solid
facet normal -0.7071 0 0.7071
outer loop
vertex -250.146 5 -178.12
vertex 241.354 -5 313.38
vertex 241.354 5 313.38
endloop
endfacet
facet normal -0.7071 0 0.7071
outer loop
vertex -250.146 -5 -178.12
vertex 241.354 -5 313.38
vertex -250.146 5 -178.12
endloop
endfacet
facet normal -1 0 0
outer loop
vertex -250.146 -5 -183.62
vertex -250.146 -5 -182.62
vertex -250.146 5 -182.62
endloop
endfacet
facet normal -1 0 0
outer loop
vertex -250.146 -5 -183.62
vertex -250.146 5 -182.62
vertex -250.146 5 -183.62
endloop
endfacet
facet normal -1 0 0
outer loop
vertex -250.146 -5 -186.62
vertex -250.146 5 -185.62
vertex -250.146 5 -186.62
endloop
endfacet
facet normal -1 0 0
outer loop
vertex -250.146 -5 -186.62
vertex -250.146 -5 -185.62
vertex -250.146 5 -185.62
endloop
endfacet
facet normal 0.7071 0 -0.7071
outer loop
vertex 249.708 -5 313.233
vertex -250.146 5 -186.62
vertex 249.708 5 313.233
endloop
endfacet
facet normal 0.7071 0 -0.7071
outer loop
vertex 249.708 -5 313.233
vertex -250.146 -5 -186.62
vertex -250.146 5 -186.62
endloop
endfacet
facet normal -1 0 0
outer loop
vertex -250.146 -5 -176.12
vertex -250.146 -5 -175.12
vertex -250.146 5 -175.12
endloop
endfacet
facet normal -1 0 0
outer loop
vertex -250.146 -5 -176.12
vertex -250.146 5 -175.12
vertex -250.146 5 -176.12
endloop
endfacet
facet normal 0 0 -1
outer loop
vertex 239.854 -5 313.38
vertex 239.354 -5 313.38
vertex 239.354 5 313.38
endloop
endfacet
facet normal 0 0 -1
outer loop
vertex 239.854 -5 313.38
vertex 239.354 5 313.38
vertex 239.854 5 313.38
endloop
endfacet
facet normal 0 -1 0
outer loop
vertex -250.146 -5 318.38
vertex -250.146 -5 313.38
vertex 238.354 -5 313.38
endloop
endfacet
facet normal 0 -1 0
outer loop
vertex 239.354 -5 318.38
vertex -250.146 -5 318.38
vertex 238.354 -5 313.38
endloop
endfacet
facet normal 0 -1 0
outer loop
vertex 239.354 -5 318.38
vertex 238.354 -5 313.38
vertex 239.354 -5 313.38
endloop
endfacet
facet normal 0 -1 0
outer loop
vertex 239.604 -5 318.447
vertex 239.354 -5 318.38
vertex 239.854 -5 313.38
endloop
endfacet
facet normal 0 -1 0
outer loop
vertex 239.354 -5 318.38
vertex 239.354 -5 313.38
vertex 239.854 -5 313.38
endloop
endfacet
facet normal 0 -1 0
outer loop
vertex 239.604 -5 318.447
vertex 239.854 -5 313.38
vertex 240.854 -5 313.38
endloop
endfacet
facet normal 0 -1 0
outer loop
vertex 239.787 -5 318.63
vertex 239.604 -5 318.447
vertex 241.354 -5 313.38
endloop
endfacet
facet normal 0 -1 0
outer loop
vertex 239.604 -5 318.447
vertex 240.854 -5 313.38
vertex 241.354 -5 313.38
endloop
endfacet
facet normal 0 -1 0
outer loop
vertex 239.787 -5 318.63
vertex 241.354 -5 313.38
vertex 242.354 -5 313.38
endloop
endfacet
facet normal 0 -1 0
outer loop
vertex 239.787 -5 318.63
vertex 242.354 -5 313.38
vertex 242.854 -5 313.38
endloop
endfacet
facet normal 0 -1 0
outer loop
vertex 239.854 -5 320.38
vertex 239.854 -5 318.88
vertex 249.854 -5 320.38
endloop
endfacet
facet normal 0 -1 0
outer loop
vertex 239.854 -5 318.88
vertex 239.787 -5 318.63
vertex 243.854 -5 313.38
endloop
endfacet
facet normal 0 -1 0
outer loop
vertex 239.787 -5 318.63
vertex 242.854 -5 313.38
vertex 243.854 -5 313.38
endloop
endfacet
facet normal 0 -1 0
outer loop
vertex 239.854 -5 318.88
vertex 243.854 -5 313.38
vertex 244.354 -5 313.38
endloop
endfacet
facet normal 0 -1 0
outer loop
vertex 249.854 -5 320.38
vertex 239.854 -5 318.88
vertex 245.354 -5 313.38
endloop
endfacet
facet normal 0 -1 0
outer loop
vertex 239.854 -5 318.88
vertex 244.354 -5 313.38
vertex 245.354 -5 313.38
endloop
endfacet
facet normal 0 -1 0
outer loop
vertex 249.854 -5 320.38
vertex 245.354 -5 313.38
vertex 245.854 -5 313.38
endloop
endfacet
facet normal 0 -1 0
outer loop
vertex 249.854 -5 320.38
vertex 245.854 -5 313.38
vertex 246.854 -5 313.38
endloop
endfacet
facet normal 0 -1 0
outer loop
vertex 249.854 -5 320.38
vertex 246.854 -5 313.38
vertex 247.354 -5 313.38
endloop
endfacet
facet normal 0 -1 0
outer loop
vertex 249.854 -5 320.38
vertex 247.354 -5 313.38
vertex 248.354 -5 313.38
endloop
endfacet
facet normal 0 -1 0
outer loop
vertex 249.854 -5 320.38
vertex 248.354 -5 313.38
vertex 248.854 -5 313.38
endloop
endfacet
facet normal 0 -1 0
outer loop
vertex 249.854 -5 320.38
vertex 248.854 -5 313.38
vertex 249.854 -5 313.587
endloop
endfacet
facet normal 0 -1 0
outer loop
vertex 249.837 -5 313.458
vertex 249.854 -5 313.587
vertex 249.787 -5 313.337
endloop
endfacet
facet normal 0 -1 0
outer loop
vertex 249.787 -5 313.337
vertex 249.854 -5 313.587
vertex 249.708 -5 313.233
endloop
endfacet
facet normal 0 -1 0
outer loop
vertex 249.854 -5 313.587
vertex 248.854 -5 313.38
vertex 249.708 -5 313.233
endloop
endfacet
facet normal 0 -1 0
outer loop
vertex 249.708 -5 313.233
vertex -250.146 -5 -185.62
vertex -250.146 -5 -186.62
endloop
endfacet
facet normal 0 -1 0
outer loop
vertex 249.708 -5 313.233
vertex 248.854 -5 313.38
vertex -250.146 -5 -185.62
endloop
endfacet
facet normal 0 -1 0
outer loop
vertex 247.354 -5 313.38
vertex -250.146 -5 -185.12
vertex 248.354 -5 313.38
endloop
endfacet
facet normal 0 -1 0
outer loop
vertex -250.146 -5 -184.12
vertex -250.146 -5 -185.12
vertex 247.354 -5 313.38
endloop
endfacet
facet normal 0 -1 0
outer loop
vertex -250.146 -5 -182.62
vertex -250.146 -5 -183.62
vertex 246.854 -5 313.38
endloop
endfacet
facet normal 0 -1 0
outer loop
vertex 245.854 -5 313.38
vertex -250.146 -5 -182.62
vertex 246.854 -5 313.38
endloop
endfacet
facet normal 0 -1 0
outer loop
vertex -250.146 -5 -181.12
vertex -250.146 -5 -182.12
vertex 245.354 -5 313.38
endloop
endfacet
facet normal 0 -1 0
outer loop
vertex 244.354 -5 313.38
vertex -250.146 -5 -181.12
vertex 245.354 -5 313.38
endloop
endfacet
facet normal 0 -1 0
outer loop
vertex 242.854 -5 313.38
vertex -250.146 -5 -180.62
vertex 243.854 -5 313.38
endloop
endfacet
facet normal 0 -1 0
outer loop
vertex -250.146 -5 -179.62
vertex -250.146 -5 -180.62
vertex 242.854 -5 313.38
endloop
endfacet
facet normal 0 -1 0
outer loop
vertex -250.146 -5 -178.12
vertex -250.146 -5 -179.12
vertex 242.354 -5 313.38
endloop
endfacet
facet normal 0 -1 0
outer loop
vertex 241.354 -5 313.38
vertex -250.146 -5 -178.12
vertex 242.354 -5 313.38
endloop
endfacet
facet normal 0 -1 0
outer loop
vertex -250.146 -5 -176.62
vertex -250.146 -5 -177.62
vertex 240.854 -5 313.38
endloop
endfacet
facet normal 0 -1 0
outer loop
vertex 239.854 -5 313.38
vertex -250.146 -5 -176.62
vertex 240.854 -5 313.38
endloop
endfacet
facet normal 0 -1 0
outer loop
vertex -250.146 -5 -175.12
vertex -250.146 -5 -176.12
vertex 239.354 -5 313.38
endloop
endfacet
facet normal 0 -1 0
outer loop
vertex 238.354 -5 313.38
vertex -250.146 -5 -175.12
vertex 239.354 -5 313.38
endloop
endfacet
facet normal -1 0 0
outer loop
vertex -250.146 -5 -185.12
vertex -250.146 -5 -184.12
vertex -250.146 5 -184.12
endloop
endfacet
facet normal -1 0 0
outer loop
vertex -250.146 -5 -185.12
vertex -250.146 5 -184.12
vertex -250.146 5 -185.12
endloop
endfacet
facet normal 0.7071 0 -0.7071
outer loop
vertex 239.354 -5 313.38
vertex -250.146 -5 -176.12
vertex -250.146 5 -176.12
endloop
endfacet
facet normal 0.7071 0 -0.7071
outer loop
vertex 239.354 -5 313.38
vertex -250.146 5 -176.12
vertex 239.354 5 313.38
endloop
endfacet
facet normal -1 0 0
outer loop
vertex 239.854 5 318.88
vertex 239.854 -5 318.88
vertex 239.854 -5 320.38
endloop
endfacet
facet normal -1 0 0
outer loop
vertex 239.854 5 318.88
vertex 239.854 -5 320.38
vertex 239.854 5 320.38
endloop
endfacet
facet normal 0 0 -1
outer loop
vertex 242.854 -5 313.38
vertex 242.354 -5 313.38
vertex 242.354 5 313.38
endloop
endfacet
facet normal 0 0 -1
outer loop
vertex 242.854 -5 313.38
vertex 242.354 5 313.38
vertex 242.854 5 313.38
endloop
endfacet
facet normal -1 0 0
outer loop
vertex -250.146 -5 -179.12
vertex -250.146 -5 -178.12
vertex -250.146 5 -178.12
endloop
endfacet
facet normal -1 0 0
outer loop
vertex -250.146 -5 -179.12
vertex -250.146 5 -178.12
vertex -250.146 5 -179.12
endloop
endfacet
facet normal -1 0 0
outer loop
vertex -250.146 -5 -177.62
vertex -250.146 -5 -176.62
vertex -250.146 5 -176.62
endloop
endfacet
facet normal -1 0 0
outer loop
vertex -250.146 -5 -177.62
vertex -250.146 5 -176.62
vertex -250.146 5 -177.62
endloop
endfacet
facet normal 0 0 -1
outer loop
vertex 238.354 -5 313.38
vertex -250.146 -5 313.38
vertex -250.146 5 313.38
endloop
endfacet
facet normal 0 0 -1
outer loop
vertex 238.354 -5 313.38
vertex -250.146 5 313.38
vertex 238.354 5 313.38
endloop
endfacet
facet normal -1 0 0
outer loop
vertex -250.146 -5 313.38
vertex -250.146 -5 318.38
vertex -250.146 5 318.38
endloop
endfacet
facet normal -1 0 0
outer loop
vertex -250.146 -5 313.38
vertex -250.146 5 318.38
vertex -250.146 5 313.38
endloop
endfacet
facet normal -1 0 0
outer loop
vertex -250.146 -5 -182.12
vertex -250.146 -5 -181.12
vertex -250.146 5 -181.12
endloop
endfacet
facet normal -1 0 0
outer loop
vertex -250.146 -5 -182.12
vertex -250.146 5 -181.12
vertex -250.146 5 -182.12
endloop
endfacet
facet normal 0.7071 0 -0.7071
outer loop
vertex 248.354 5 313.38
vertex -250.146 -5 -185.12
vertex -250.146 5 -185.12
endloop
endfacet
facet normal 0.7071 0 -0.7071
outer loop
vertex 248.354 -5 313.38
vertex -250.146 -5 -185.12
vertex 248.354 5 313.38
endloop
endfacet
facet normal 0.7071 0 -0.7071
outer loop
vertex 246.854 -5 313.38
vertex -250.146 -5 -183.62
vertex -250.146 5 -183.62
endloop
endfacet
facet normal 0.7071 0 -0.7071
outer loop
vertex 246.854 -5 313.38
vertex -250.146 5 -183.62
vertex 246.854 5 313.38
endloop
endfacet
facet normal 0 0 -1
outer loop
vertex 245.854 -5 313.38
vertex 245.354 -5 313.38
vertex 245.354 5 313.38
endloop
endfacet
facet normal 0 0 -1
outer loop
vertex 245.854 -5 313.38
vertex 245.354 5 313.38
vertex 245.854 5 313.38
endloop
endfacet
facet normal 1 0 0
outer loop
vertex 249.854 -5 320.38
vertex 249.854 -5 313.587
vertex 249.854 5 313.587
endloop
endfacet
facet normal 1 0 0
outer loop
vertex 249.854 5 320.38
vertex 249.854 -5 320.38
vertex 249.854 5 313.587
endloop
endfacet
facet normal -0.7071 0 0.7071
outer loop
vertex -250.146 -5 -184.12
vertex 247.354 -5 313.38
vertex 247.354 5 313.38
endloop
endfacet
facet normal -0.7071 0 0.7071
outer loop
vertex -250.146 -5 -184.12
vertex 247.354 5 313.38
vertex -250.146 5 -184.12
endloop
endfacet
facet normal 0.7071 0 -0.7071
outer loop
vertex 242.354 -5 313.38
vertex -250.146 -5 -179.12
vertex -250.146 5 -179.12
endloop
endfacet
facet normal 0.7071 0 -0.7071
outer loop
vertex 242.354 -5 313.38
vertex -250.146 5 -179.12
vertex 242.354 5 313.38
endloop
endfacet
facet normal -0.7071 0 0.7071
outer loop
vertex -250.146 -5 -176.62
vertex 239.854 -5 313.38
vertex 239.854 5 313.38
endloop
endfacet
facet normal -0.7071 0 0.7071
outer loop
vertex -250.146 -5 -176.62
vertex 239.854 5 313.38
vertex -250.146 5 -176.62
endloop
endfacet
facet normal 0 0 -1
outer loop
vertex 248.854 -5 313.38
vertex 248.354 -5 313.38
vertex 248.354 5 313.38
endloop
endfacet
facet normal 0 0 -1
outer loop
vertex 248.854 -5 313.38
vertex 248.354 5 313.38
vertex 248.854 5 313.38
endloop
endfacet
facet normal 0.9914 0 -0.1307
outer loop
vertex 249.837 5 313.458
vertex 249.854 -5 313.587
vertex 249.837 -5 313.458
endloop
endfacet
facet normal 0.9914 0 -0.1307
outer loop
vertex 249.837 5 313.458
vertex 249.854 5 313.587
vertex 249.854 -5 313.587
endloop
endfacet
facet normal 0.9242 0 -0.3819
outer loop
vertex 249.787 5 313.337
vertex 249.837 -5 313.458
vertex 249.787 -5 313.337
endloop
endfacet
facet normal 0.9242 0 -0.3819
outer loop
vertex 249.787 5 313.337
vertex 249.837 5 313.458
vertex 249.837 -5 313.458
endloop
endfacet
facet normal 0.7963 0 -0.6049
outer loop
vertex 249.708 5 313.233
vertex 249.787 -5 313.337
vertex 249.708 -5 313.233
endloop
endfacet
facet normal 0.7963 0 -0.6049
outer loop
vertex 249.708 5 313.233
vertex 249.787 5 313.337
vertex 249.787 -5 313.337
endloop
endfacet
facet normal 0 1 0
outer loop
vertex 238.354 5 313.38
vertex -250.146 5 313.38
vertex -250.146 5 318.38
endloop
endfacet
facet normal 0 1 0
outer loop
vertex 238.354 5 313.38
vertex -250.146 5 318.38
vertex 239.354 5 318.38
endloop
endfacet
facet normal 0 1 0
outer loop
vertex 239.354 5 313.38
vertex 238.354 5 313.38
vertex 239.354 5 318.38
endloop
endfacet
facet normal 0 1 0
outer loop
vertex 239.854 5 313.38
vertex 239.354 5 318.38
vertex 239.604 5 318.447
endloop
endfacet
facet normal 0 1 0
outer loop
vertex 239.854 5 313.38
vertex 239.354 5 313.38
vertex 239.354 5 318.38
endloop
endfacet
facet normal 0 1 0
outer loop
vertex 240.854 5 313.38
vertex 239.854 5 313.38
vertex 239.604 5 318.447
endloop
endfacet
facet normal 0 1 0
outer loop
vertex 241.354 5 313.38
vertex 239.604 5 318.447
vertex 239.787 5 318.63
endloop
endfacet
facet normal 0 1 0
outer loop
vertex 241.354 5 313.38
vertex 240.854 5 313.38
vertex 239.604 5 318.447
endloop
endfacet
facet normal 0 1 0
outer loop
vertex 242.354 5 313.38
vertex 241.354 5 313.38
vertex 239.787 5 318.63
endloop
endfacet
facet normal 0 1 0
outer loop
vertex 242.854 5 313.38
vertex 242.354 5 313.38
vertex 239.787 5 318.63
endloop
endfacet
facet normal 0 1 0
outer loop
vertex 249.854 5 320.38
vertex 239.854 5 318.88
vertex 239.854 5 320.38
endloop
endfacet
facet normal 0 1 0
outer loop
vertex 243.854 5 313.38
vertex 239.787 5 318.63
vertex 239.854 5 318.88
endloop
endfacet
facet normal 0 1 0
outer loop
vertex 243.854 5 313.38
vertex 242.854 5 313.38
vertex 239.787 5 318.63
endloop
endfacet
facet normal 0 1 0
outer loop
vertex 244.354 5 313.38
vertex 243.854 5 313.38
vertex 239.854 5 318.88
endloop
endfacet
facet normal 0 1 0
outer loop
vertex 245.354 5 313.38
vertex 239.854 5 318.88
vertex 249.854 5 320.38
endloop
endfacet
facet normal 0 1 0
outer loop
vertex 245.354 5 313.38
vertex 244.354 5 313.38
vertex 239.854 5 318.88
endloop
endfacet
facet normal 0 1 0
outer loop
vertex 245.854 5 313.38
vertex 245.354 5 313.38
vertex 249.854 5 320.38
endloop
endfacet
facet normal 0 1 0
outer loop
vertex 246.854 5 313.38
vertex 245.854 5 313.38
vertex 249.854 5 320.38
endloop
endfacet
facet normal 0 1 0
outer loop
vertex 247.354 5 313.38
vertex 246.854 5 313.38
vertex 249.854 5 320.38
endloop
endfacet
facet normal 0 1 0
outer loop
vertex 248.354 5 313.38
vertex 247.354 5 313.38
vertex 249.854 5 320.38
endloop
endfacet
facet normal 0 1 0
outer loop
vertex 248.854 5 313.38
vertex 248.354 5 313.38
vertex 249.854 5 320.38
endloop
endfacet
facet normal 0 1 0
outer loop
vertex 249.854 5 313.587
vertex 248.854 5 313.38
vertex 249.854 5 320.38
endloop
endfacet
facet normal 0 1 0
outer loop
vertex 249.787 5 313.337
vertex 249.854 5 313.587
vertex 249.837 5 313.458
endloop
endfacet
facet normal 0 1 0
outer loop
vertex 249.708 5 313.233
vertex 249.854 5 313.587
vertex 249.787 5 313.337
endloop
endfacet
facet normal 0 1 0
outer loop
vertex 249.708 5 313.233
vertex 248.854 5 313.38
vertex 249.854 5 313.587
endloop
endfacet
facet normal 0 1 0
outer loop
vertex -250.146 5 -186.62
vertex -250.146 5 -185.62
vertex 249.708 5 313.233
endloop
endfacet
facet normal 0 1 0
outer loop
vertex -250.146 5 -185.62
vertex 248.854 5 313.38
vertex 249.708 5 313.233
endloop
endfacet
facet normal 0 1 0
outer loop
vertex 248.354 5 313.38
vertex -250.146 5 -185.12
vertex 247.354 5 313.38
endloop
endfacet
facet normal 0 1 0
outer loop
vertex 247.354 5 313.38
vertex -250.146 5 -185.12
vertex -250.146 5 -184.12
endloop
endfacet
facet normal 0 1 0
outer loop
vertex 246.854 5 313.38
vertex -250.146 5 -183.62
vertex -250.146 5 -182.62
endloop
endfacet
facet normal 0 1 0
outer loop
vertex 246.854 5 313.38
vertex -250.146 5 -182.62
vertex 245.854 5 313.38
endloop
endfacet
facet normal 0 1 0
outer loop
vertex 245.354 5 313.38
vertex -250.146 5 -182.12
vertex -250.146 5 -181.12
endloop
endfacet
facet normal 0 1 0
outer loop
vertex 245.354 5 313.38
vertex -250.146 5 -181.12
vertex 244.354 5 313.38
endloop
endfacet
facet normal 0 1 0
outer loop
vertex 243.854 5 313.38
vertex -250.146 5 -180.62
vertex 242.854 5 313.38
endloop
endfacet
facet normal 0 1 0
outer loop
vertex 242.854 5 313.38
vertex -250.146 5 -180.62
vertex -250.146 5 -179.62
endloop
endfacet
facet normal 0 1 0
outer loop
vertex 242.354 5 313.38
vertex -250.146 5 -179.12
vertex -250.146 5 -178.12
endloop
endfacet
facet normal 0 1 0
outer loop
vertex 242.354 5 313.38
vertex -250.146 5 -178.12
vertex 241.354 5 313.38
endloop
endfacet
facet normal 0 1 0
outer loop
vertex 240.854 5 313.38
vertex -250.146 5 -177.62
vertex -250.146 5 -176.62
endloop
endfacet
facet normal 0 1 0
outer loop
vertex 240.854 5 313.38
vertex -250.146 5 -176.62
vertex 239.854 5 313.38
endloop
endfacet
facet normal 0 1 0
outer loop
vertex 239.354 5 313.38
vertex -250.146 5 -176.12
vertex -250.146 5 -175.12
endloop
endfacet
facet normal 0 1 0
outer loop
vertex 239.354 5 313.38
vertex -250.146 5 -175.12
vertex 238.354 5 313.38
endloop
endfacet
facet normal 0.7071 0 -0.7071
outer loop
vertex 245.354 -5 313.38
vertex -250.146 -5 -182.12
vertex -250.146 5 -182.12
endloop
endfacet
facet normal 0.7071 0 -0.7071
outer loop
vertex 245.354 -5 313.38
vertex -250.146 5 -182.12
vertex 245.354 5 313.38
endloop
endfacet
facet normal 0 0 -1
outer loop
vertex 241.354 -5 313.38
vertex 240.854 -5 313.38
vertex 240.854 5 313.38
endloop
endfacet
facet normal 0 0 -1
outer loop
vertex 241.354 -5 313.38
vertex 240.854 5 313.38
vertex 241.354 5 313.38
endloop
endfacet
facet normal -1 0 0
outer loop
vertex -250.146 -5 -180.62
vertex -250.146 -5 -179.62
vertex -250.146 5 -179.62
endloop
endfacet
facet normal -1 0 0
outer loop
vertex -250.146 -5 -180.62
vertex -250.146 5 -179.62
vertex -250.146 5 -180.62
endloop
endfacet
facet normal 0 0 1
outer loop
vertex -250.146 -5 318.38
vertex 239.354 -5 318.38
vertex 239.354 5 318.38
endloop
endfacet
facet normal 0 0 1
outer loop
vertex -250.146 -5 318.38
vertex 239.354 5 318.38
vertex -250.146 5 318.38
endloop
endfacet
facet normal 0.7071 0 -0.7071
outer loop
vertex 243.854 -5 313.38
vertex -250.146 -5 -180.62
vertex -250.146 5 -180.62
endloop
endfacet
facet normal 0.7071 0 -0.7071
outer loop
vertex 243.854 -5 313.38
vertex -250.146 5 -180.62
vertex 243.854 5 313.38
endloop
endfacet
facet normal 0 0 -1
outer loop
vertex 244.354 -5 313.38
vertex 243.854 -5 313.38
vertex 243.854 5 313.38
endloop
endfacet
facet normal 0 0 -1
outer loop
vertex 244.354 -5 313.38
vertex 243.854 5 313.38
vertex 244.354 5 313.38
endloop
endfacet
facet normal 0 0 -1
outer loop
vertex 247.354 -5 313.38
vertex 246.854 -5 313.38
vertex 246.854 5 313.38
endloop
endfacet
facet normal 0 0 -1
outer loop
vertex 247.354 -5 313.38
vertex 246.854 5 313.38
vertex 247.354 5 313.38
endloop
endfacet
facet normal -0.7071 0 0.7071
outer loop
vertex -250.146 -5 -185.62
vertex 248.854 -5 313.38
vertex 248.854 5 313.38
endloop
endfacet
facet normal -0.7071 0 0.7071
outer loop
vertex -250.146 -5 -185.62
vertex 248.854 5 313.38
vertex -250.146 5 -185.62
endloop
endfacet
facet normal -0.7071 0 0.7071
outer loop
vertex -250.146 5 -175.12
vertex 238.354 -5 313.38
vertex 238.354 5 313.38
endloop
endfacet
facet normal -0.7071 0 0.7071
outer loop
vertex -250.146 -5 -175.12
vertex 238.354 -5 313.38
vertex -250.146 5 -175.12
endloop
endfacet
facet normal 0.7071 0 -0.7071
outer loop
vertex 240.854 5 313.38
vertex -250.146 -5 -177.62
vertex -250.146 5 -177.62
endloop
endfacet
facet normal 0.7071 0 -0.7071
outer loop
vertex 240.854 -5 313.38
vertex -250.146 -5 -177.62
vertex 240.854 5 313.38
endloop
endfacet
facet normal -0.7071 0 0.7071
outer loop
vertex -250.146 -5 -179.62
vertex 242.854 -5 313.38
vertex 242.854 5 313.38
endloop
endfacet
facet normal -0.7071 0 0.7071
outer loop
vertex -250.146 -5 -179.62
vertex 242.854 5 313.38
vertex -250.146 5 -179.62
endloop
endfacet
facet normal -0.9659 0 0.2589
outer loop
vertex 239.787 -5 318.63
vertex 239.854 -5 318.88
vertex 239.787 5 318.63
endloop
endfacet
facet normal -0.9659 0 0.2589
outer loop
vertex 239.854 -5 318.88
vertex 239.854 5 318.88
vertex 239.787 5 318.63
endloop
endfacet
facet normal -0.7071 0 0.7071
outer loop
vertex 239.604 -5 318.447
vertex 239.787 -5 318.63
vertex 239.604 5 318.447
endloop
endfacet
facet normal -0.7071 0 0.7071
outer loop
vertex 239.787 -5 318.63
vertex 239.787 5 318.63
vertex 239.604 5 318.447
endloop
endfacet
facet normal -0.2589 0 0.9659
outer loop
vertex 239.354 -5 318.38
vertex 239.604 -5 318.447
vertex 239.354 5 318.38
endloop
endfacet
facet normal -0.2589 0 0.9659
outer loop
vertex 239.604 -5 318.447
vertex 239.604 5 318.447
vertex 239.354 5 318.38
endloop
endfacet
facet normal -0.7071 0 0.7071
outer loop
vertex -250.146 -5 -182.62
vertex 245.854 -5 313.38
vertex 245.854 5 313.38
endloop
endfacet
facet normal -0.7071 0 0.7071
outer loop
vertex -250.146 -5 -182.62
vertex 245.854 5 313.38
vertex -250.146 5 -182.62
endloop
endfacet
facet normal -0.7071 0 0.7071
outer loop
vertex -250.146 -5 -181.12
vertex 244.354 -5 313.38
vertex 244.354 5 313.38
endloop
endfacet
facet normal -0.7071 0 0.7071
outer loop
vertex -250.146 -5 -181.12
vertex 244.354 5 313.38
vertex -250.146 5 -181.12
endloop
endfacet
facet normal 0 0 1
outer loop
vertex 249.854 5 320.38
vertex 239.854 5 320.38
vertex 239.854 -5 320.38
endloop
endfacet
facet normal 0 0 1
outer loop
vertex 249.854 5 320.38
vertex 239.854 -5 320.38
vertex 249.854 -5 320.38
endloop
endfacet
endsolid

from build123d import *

# Parameters (mm, degrees)
F1_DEPTH = 5
F3_W     = 10
F3_H     = 10
F4_DEPTH = 2
F5_R     = 0.5


with BuildPart() as f1:
    # F0 (on Front) → F1 (new body, symmetric)
    with BuildSketch(Plane.XZ):
        Polygon((249.854166, 313.379943), (249.854166, 318.379943), (-250.145834, 318.379943), (-250.145834, 313.379943), (238.354166, 313.379943), (239.354166, 313.379943), (239.854166, 313.379943), (240.854166, 313.379943), (241.354166, 313.379943), (242.354166, 313.379943), (242.854166, 313.379943), (243.854166, 313.379943), (244.354166, 313.379943), (245.354166, 313.379943), (245.854166, 313.379943), (246.854166, 313.379943), (247.354166, 313.379943), (248.354166, 313.379943), (248.854166, 313.379943), align=None)
        Polygon((-250.145834, -185.120057), (248.354166, 313.379943), (247.354166, 313.379943), (-250.145834, -184.120057), align=None)
        Polygon((-250.145834, -186.620057), (249.854166, 313.379943), (248.854166, 313.379943), (-250.145834, -185.620057), align=None)
        Polygon((-250.145834, -182.120057), (245.354166, 313.379943), (244.354166, 313.379943), (-250.145834, -181.120057), align=None)
        Polygon((-250.145834, -183.620057), (246.854166, 313.379943), (245.854166, 313.379943), (-250.145834, -182.620057), align=None)
        Polygon((240.854166, 313.379943), (239.854166, 313.379943), (-250.145834, -176.620057), (-250.145834, -177.620057), align=None)
        Polygon((242.354166, 313.379943), (241.354166, 313.379943), (-250.145834, -178.120057), (-250.145834, -179.120057), align=None)
        Polygon((-250.145834, -180.620057), (243.854166, 313.379943), (242.854166, 313.379943), (-250.145834, -179.620057), align=None)
        Polygon((239.354166, 313.379943), (238.354166, 313.379943), (-250.145834, -175.120057), (-250.145834, -176.120057), align=None)
    extrude(amount=F1_DEPTH, both=True)

    # F3 (on face) → F4 (join)
    with BuildSketch(Plane.XY.offset(318.379943)):
        with Locations((244.854166, 0)):
            Rectangle(F3_W, F3_H)
    extrude(amount=F4_DEPTH)

    # F5
    f5_edges = [f1.edges().sort_by_distance(p)[0] for p in [
        (239.854166, 0, 318.379943),
        (249.854166, 0, 313.379943),
    ]]
    fillet(f5_edges, radius=F5_R)


solid = f1.part
